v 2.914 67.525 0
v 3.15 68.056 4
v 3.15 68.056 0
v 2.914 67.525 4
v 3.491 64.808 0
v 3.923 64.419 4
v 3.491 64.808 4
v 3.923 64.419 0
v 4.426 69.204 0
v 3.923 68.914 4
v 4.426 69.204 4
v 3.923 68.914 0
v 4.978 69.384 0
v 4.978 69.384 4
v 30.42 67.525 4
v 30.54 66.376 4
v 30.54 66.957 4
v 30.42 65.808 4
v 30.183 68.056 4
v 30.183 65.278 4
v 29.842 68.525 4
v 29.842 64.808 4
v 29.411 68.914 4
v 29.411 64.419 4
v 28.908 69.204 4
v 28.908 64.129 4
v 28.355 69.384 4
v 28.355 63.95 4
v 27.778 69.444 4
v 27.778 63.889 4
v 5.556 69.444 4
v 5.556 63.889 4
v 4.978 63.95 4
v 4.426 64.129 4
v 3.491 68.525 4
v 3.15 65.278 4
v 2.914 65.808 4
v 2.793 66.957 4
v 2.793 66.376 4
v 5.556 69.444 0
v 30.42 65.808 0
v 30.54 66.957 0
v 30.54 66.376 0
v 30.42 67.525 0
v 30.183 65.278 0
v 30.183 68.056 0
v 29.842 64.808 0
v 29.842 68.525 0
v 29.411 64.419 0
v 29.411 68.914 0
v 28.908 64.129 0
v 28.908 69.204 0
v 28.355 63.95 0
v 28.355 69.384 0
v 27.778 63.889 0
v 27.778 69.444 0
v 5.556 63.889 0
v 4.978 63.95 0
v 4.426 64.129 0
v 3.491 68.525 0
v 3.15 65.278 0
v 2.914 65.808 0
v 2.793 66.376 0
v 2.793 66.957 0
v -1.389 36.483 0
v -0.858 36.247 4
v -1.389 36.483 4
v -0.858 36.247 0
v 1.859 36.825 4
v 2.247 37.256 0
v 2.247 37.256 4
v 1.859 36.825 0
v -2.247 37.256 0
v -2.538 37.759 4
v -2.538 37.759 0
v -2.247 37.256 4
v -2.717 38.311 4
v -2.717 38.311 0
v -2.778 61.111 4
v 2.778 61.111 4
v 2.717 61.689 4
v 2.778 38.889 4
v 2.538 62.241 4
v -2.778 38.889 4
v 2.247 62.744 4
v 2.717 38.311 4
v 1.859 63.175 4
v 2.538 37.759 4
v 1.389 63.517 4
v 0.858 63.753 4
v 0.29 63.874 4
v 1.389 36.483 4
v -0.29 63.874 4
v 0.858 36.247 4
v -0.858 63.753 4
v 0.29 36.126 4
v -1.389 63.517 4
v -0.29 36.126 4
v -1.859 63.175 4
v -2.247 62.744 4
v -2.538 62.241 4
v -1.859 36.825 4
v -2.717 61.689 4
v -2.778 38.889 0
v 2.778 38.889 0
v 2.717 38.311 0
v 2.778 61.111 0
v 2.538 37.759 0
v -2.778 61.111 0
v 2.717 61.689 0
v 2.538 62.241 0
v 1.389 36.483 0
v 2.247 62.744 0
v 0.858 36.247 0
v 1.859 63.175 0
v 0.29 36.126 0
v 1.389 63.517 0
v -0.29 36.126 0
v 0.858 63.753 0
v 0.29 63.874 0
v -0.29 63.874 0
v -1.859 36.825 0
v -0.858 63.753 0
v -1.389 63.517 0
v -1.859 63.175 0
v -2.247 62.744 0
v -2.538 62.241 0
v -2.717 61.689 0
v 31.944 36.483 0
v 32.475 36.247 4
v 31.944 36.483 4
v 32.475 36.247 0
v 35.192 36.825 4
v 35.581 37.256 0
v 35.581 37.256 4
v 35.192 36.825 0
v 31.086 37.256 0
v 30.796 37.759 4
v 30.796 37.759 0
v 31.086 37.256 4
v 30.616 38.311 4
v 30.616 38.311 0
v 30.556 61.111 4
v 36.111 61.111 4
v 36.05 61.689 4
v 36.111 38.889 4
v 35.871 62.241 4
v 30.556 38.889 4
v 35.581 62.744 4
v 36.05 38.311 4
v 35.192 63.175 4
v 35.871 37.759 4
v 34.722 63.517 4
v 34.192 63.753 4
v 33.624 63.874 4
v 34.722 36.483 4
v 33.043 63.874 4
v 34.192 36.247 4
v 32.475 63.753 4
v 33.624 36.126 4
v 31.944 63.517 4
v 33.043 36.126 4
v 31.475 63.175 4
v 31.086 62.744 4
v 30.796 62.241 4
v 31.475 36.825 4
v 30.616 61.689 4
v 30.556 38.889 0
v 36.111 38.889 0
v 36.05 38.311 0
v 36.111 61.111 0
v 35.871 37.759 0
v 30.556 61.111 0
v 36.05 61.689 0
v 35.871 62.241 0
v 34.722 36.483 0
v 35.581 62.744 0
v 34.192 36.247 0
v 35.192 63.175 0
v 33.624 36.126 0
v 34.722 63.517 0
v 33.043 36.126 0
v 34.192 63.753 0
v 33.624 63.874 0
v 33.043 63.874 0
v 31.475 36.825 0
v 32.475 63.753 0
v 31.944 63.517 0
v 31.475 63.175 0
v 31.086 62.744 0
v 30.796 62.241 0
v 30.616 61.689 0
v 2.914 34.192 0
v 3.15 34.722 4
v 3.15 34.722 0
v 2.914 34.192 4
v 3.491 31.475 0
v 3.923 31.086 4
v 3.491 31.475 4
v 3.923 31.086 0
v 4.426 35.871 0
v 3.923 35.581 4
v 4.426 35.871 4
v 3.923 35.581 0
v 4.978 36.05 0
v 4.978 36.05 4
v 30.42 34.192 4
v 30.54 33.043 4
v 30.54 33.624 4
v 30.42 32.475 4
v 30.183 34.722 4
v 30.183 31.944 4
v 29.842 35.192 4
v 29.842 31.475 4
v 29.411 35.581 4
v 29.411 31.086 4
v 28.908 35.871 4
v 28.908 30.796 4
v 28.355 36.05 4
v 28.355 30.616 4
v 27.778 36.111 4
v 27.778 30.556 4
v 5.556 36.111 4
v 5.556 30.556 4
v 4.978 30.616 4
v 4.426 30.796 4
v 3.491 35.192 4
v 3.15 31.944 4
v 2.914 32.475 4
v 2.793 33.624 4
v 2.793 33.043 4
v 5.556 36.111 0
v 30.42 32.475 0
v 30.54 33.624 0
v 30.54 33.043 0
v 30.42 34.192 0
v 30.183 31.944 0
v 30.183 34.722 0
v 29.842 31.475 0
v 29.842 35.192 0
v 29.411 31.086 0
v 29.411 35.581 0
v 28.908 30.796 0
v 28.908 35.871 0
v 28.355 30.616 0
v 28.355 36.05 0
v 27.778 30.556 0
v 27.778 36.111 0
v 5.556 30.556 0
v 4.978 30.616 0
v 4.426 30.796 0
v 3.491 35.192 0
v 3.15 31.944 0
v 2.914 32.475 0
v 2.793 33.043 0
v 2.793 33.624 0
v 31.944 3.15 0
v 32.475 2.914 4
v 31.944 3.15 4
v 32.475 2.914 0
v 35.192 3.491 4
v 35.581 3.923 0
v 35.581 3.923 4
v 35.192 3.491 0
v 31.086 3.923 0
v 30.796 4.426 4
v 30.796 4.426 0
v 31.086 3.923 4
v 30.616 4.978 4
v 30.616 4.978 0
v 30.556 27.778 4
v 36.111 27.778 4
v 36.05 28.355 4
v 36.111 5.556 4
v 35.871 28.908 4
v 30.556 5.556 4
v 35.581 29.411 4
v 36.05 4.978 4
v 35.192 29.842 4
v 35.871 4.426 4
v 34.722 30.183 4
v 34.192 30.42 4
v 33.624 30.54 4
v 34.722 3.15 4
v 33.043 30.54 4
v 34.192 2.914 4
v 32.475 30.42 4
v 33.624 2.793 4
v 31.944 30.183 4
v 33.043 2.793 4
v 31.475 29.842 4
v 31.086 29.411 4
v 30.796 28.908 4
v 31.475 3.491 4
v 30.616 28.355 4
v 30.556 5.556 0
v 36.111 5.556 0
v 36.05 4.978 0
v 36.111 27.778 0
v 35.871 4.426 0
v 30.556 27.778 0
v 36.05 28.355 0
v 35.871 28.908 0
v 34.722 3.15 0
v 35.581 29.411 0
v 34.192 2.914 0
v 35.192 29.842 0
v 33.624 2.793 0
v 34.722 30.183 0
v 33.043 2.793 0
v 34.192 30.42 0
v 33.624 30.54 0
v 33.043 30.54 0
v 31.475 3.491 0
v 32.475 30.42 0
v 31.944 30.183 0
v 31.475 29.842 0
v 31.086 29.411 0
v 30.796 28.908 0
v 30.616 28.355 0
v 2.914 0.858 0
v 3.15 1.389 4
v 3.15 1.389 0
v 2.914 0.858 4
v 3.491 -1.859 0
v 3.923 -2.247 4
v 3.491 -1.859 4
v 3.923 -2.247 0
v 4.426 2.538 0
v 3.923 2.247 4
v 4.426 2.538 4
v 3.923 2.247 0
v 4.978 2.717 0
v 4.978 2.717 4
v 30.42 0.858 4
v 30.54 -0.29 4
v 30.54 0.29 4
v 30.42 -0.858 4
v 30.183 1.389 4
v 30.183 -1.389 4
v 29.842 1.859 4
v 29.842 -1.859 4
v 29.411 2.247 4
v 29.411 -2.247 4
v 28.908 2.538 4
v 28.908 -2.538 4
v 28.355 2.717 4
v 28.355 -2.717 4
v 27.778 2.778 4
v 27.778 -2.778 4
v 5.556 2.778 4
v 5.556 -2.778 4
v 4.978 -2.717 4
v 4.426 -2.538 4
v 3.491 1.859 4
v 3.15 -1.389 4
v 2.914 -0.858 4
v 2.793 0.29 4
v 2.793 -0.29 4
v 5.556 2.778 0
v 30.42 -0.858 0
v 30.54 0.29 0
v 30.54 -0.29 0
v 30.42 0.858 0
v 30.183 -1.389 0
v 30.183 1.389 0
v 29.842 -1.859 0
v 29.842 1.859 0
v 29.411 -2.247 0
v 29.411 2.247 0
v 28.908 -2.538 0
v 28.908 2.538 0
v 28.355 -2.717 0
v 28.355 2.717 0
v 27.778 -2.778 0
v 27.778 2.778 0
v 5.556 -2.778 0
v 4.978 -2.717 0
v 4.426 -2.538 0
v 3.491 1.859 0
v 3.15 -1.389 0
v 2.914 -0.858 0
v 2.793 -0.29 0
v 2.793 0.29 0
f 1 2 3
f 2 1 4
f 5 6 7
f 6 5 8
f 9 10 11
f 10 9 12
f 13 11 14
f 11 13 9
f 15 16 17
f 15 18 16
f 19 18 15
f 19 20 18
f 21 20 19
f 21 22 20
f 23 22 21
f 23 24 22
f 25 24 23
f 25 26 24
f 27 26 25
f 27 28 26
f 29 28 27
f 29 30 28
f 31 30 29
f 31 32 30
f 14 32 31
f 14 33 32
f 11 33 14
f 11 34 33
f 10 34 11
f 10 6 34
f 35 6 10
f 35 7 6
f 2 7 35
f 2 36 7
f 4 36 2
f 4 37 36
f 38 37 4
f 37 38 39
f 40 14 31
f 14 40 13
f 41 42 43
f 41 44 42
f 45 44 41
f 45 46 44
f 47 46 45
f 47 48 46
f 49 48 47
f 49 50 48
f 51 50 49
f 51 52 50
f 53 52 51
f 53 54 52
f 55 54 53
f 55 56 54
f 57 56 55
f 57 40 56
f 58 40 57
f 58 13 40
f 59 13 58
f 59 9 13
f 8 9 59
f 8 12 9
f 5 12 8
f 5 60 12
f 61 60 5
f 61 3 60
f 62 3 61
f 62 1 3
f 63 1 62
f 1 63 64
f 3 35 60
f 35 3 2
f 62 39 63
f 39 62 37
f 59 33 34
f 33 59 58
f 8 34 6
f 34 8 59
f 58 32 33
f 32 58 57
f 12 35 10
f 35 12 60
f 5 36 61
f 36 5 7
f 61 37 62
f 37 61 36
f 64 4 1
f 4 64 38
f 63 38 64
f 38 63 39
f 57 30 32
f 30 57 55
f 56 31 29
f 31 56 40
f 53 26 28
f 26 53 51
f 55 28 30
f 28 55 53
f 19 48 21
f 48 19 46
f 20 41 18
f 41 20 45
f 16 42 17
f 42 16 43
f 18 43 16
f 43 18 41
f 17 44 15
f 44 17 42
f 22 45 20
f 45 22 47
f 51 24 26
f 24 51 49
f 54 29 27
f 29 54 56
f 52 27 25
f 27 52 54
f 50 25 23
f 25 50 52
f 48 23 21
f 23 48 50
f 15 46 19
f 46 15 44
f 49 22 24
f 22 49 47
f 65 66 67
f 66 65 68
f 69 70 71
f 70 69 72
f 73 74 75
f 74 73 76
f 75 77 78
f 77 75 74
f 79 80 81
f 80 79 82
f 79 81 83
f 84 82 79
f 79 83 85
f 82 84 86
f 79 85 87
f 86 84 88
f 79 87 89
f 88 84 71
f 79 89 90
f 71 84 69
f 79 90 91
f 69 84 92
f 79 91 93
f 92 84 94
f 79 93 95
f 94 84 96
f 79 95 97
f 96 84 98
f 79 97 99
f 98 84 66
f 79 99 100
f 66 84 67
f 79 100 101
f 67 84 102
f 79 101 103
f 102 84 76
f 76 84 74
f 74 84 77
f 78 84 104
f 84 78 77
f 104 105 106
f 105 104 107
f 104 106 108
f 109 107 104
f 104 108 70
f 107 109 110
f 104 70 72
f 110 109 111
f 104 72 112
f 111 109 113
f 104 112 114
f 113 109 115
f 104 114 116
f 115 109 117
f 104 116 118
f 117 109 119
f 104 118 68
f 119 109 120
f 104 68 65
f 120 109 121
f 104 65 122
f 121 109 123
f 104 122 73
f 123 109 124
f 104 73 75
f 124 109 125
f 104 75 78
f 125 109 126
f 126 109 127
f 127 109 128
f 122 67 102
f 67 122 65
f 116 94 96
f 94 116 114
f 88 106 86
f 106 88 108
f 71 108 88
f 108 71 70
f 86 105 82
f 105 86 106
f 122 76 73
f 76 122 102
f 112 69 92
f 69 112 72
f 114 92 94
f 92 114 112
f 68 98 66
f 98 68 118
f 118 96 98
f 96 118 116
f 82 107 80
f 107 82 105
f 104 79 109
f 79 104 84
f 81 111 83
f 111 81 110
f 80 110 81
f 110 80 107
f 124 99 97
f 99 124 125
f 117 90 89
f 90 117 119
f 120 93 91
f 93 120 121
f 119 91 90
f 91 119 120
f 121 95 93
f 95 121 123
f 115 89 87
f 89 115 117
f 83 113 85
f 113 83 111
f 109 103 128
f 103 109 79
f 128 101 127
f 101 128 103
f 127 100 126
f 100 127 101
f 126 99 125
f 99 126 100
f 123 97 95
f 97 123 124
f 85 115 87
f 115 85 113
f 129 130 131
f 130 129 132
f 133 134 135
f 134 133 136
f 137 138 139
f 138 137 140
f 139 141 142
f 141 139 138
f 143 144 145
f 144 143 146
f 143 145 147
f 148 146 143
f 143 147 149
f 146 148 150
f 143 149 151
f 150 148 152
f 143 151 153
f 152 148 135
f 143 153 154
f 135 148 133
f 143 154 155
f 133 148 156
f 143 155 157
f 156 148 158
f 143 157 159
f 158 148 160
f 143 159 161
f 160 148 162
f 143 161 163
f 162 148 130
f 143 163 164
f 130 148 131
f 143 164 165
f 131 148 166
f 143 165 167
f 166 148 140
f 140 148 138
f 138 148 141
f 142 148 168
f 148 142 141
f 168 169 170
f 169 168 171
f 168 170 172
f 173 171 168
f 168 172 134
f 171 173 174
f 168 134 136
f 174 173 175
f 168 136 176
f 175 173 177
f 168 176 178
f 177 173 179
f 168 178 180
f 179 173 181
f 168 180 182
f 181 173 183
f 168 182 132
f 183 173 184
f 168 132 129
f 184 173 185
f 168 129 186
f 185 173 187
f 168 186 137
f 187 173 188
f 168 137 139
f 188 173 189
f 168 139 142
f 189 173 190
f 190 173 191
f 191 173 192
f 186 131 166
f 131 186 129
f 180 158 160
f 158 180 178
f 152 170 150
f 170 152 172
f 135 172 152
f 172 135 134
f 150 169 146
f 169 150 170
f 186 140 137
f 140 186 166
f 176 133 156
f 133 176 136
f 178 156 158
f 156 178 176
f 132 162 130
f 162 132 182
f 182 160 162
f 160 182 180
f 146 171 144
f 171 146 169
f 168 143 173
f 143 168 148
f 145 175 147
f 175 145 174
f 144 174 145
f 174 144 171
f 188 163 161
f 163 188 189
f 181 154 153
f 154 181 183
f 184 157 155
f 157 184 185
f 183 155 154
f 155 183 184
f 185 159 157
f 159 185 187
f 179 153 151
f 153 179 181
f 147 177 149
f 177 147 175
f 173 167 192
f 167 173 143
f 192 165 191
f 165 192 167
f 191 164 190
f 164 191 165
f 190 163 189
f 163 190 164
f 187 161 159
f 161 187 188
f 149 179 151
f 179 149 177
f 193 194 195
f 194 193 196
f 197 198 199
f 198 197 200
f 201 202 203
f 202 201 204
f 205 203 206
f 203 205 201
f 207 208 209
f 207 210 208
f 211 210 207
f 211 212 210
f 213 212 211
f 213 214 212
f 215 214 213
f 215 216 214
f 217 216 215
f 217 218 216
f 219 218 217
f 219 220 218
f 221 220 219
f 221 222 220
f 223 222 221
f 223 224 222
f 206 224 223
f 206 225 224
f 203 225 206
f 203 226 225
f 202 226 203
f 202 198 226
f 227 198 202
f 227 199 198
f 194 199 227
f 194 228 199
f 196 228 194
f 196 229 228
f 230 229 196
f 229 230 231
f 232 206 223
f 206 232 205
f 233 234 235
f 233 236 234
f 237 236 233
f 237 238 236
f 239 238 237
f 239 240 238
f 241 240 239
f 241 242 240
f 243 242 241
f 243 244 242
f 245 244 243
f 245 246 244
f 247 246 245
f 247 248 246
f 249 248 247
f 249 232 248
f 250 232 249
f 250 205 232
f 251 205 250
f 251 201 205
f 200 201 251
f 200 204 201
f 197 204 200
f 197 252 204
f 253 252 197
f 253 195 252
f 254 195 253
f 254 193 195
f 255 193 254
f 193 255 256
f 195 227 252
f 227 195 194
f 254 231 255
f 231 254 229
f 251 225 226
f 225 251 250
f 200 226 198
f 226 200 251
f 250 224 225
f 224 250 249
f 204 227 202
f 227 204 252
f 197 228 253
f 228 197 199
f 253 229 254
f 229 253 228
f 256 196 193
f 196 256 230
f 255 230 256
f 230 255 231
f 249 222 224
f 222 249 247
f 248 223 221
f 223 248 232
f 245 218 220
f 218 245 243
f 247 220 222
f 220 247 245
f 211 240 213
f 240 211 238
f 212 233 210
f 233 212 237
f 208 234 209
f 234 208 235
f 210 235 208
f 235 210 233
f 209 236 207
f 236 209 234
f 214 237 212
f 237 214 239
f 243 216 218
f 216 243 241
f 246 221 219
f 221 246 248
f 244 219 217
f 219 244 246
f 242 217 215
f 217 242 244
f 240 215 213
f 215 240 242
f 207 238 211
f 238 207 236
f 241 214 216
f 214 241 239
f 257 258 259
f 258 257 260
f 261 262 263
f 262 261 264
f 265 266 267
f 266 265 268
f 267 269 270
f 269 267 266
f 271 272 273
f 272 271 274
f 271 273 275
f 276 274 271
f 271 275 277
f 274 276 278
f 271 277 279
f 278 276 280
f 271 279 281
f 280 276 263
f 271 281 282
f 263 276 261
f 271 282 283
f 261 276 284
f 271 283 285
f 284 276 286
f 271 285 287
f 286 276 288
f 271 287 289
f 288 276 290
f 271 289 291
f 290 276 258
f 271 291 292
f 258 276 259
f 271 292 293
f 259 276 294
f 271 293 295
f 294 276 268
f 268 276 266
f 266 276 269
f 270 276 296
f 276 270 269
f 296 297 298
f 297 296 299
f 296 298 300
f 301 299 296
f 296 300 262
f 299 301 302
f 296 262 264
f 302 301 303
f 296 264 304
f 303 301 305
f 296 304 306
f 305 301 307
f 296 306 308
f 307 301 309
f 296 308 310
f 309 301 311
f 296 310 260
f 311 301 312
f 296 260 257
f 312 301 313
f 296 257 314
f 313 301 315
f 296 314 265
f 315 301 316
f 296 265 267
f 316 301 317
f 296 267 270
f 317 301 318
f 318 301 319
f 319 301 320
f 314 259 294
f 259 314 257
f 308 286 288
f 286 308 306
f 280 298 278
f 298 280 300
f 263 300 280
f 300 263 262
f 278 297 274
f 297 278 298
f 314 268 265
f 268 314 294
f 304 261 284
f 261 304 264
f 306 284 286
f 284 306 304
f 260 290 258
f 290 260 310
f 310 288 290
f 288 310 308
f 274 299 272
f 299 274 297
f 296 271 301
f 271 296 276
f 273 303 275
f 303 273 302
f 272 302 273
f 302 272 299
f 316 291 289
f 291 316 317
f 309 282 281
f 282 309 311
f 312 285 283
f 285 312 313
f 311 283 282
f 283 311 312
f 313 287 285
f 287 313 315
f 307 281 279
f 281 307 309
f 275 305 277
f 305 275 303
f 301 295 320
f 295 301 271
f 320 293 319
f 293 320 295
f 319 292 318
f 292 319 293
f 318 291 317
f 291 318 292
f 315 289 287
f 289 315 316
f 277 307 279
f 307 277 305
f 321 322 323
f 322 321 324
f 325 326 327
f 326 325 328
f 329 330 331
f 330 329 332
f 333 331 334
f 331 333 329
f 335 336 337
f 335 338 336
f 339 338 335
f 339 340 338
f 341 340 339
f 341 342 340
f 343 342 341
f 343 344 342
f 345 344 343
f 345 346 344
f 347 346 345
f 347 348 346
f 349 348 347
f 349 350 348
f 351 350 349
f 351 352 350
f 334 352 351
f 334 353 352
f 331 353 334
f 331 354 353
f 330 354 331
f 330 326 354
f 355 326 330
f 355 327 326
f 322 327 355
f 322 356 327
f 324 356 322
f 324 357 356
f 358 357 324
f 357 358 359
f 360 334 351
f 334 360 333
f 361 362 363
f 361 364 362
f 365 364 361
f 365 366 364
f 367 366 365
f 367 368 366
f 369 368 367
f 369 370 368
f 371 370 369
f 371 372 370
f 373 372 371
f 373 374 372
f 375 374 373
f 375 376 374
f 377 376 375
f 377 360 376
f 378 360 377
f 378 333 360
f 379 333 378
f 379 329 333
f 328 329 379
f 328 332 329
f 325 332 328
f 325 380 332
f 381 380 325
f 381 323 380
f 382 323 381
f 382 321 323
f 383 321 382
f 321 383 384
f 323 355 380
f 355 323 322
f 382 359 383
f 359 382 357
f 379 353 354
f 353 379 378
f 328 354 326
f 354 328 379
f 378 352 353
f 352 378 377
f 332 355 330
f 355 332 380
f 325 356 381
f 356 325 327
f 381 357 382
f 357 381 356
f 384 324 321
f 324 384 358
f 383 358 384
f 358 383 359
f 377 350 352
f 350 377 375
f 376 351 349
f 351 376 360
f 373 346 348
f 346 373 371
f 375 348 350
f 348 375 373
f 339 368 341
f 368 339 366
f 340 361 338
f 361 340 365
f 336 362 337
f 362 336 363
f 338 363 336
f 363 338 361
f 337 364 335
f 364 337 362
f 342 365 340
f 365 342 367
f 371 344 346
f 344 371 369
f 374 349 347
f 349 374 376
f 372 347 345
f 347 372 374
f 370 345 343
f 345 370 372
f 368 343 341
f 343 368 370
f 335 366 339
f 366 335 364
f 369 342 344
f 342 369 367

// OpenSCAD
module SoftCube(size) {
  x=size[0];
  y=size[1];
  z=size[2];
  if (x>y) {
    translate([0,y,0]) rotate([0,0,-90]) SoftCube([y,x,z]);
  } else {
    translate([x/2,x/2,0]) linear_extrude(z) circle(x/2);
    translate([0,x/2,0]) cube([x,y-x,z]);
    translate([x/2,x/2+y-x,0]) linear_extrude(z) circle(x/2);
  }
}

segments = [
  [[0,2,0],[0,0,-90]],
  [[0,1,0],[0,0,0]],
  [[1,1,0],[0,0,0]],
  [[0,1,0],[0,0,-90]],
  [[0,0,0],[0,0,0]],
  [[1,0,0],[0,0,0]],
  [[0,0,0],[0,0,-90]],
];
activeSegments=[
[1,1,1,0,1,1,1], //0
[0,0,1,0,0,1,0], //1
[1,0,1,1,1,0,1], //2
[1,0,1,1,0,1,1], //3
[0,1,1,1,0,1,0], //4
[0,1,0,0,1,0,0], //5
[1,1,0,1,1,1,1], //6
[1,0,1,0,0,1,0], //7
[1,1,1,1,1,1,1], //8
[1,1,1,1,0,1,1], //9
];

//SoftCube($fn=30,[60,10,4]);
//SoftCube($fn=30,[10,60,4]);

module segment8(active=[1,1,1,1,1,1,1,1],size=100, h=4) {
  $fn=30;
  width=size/3/6;
  gap=width;
  for (i=[0:len(segments)-1]) {
    if (active[i]==1) {
      s=segments[i];
      translate(s[0]*size/3) rotate(s[1]) translate([-width/2,gap/2,0]) SoftCube([width,size/3-gap,h]);
    }
  }
}

module segment(n,size=100, h=4) {
  segment8(active=activeSegments[n],size=size,h=h);
}

segment(9);
